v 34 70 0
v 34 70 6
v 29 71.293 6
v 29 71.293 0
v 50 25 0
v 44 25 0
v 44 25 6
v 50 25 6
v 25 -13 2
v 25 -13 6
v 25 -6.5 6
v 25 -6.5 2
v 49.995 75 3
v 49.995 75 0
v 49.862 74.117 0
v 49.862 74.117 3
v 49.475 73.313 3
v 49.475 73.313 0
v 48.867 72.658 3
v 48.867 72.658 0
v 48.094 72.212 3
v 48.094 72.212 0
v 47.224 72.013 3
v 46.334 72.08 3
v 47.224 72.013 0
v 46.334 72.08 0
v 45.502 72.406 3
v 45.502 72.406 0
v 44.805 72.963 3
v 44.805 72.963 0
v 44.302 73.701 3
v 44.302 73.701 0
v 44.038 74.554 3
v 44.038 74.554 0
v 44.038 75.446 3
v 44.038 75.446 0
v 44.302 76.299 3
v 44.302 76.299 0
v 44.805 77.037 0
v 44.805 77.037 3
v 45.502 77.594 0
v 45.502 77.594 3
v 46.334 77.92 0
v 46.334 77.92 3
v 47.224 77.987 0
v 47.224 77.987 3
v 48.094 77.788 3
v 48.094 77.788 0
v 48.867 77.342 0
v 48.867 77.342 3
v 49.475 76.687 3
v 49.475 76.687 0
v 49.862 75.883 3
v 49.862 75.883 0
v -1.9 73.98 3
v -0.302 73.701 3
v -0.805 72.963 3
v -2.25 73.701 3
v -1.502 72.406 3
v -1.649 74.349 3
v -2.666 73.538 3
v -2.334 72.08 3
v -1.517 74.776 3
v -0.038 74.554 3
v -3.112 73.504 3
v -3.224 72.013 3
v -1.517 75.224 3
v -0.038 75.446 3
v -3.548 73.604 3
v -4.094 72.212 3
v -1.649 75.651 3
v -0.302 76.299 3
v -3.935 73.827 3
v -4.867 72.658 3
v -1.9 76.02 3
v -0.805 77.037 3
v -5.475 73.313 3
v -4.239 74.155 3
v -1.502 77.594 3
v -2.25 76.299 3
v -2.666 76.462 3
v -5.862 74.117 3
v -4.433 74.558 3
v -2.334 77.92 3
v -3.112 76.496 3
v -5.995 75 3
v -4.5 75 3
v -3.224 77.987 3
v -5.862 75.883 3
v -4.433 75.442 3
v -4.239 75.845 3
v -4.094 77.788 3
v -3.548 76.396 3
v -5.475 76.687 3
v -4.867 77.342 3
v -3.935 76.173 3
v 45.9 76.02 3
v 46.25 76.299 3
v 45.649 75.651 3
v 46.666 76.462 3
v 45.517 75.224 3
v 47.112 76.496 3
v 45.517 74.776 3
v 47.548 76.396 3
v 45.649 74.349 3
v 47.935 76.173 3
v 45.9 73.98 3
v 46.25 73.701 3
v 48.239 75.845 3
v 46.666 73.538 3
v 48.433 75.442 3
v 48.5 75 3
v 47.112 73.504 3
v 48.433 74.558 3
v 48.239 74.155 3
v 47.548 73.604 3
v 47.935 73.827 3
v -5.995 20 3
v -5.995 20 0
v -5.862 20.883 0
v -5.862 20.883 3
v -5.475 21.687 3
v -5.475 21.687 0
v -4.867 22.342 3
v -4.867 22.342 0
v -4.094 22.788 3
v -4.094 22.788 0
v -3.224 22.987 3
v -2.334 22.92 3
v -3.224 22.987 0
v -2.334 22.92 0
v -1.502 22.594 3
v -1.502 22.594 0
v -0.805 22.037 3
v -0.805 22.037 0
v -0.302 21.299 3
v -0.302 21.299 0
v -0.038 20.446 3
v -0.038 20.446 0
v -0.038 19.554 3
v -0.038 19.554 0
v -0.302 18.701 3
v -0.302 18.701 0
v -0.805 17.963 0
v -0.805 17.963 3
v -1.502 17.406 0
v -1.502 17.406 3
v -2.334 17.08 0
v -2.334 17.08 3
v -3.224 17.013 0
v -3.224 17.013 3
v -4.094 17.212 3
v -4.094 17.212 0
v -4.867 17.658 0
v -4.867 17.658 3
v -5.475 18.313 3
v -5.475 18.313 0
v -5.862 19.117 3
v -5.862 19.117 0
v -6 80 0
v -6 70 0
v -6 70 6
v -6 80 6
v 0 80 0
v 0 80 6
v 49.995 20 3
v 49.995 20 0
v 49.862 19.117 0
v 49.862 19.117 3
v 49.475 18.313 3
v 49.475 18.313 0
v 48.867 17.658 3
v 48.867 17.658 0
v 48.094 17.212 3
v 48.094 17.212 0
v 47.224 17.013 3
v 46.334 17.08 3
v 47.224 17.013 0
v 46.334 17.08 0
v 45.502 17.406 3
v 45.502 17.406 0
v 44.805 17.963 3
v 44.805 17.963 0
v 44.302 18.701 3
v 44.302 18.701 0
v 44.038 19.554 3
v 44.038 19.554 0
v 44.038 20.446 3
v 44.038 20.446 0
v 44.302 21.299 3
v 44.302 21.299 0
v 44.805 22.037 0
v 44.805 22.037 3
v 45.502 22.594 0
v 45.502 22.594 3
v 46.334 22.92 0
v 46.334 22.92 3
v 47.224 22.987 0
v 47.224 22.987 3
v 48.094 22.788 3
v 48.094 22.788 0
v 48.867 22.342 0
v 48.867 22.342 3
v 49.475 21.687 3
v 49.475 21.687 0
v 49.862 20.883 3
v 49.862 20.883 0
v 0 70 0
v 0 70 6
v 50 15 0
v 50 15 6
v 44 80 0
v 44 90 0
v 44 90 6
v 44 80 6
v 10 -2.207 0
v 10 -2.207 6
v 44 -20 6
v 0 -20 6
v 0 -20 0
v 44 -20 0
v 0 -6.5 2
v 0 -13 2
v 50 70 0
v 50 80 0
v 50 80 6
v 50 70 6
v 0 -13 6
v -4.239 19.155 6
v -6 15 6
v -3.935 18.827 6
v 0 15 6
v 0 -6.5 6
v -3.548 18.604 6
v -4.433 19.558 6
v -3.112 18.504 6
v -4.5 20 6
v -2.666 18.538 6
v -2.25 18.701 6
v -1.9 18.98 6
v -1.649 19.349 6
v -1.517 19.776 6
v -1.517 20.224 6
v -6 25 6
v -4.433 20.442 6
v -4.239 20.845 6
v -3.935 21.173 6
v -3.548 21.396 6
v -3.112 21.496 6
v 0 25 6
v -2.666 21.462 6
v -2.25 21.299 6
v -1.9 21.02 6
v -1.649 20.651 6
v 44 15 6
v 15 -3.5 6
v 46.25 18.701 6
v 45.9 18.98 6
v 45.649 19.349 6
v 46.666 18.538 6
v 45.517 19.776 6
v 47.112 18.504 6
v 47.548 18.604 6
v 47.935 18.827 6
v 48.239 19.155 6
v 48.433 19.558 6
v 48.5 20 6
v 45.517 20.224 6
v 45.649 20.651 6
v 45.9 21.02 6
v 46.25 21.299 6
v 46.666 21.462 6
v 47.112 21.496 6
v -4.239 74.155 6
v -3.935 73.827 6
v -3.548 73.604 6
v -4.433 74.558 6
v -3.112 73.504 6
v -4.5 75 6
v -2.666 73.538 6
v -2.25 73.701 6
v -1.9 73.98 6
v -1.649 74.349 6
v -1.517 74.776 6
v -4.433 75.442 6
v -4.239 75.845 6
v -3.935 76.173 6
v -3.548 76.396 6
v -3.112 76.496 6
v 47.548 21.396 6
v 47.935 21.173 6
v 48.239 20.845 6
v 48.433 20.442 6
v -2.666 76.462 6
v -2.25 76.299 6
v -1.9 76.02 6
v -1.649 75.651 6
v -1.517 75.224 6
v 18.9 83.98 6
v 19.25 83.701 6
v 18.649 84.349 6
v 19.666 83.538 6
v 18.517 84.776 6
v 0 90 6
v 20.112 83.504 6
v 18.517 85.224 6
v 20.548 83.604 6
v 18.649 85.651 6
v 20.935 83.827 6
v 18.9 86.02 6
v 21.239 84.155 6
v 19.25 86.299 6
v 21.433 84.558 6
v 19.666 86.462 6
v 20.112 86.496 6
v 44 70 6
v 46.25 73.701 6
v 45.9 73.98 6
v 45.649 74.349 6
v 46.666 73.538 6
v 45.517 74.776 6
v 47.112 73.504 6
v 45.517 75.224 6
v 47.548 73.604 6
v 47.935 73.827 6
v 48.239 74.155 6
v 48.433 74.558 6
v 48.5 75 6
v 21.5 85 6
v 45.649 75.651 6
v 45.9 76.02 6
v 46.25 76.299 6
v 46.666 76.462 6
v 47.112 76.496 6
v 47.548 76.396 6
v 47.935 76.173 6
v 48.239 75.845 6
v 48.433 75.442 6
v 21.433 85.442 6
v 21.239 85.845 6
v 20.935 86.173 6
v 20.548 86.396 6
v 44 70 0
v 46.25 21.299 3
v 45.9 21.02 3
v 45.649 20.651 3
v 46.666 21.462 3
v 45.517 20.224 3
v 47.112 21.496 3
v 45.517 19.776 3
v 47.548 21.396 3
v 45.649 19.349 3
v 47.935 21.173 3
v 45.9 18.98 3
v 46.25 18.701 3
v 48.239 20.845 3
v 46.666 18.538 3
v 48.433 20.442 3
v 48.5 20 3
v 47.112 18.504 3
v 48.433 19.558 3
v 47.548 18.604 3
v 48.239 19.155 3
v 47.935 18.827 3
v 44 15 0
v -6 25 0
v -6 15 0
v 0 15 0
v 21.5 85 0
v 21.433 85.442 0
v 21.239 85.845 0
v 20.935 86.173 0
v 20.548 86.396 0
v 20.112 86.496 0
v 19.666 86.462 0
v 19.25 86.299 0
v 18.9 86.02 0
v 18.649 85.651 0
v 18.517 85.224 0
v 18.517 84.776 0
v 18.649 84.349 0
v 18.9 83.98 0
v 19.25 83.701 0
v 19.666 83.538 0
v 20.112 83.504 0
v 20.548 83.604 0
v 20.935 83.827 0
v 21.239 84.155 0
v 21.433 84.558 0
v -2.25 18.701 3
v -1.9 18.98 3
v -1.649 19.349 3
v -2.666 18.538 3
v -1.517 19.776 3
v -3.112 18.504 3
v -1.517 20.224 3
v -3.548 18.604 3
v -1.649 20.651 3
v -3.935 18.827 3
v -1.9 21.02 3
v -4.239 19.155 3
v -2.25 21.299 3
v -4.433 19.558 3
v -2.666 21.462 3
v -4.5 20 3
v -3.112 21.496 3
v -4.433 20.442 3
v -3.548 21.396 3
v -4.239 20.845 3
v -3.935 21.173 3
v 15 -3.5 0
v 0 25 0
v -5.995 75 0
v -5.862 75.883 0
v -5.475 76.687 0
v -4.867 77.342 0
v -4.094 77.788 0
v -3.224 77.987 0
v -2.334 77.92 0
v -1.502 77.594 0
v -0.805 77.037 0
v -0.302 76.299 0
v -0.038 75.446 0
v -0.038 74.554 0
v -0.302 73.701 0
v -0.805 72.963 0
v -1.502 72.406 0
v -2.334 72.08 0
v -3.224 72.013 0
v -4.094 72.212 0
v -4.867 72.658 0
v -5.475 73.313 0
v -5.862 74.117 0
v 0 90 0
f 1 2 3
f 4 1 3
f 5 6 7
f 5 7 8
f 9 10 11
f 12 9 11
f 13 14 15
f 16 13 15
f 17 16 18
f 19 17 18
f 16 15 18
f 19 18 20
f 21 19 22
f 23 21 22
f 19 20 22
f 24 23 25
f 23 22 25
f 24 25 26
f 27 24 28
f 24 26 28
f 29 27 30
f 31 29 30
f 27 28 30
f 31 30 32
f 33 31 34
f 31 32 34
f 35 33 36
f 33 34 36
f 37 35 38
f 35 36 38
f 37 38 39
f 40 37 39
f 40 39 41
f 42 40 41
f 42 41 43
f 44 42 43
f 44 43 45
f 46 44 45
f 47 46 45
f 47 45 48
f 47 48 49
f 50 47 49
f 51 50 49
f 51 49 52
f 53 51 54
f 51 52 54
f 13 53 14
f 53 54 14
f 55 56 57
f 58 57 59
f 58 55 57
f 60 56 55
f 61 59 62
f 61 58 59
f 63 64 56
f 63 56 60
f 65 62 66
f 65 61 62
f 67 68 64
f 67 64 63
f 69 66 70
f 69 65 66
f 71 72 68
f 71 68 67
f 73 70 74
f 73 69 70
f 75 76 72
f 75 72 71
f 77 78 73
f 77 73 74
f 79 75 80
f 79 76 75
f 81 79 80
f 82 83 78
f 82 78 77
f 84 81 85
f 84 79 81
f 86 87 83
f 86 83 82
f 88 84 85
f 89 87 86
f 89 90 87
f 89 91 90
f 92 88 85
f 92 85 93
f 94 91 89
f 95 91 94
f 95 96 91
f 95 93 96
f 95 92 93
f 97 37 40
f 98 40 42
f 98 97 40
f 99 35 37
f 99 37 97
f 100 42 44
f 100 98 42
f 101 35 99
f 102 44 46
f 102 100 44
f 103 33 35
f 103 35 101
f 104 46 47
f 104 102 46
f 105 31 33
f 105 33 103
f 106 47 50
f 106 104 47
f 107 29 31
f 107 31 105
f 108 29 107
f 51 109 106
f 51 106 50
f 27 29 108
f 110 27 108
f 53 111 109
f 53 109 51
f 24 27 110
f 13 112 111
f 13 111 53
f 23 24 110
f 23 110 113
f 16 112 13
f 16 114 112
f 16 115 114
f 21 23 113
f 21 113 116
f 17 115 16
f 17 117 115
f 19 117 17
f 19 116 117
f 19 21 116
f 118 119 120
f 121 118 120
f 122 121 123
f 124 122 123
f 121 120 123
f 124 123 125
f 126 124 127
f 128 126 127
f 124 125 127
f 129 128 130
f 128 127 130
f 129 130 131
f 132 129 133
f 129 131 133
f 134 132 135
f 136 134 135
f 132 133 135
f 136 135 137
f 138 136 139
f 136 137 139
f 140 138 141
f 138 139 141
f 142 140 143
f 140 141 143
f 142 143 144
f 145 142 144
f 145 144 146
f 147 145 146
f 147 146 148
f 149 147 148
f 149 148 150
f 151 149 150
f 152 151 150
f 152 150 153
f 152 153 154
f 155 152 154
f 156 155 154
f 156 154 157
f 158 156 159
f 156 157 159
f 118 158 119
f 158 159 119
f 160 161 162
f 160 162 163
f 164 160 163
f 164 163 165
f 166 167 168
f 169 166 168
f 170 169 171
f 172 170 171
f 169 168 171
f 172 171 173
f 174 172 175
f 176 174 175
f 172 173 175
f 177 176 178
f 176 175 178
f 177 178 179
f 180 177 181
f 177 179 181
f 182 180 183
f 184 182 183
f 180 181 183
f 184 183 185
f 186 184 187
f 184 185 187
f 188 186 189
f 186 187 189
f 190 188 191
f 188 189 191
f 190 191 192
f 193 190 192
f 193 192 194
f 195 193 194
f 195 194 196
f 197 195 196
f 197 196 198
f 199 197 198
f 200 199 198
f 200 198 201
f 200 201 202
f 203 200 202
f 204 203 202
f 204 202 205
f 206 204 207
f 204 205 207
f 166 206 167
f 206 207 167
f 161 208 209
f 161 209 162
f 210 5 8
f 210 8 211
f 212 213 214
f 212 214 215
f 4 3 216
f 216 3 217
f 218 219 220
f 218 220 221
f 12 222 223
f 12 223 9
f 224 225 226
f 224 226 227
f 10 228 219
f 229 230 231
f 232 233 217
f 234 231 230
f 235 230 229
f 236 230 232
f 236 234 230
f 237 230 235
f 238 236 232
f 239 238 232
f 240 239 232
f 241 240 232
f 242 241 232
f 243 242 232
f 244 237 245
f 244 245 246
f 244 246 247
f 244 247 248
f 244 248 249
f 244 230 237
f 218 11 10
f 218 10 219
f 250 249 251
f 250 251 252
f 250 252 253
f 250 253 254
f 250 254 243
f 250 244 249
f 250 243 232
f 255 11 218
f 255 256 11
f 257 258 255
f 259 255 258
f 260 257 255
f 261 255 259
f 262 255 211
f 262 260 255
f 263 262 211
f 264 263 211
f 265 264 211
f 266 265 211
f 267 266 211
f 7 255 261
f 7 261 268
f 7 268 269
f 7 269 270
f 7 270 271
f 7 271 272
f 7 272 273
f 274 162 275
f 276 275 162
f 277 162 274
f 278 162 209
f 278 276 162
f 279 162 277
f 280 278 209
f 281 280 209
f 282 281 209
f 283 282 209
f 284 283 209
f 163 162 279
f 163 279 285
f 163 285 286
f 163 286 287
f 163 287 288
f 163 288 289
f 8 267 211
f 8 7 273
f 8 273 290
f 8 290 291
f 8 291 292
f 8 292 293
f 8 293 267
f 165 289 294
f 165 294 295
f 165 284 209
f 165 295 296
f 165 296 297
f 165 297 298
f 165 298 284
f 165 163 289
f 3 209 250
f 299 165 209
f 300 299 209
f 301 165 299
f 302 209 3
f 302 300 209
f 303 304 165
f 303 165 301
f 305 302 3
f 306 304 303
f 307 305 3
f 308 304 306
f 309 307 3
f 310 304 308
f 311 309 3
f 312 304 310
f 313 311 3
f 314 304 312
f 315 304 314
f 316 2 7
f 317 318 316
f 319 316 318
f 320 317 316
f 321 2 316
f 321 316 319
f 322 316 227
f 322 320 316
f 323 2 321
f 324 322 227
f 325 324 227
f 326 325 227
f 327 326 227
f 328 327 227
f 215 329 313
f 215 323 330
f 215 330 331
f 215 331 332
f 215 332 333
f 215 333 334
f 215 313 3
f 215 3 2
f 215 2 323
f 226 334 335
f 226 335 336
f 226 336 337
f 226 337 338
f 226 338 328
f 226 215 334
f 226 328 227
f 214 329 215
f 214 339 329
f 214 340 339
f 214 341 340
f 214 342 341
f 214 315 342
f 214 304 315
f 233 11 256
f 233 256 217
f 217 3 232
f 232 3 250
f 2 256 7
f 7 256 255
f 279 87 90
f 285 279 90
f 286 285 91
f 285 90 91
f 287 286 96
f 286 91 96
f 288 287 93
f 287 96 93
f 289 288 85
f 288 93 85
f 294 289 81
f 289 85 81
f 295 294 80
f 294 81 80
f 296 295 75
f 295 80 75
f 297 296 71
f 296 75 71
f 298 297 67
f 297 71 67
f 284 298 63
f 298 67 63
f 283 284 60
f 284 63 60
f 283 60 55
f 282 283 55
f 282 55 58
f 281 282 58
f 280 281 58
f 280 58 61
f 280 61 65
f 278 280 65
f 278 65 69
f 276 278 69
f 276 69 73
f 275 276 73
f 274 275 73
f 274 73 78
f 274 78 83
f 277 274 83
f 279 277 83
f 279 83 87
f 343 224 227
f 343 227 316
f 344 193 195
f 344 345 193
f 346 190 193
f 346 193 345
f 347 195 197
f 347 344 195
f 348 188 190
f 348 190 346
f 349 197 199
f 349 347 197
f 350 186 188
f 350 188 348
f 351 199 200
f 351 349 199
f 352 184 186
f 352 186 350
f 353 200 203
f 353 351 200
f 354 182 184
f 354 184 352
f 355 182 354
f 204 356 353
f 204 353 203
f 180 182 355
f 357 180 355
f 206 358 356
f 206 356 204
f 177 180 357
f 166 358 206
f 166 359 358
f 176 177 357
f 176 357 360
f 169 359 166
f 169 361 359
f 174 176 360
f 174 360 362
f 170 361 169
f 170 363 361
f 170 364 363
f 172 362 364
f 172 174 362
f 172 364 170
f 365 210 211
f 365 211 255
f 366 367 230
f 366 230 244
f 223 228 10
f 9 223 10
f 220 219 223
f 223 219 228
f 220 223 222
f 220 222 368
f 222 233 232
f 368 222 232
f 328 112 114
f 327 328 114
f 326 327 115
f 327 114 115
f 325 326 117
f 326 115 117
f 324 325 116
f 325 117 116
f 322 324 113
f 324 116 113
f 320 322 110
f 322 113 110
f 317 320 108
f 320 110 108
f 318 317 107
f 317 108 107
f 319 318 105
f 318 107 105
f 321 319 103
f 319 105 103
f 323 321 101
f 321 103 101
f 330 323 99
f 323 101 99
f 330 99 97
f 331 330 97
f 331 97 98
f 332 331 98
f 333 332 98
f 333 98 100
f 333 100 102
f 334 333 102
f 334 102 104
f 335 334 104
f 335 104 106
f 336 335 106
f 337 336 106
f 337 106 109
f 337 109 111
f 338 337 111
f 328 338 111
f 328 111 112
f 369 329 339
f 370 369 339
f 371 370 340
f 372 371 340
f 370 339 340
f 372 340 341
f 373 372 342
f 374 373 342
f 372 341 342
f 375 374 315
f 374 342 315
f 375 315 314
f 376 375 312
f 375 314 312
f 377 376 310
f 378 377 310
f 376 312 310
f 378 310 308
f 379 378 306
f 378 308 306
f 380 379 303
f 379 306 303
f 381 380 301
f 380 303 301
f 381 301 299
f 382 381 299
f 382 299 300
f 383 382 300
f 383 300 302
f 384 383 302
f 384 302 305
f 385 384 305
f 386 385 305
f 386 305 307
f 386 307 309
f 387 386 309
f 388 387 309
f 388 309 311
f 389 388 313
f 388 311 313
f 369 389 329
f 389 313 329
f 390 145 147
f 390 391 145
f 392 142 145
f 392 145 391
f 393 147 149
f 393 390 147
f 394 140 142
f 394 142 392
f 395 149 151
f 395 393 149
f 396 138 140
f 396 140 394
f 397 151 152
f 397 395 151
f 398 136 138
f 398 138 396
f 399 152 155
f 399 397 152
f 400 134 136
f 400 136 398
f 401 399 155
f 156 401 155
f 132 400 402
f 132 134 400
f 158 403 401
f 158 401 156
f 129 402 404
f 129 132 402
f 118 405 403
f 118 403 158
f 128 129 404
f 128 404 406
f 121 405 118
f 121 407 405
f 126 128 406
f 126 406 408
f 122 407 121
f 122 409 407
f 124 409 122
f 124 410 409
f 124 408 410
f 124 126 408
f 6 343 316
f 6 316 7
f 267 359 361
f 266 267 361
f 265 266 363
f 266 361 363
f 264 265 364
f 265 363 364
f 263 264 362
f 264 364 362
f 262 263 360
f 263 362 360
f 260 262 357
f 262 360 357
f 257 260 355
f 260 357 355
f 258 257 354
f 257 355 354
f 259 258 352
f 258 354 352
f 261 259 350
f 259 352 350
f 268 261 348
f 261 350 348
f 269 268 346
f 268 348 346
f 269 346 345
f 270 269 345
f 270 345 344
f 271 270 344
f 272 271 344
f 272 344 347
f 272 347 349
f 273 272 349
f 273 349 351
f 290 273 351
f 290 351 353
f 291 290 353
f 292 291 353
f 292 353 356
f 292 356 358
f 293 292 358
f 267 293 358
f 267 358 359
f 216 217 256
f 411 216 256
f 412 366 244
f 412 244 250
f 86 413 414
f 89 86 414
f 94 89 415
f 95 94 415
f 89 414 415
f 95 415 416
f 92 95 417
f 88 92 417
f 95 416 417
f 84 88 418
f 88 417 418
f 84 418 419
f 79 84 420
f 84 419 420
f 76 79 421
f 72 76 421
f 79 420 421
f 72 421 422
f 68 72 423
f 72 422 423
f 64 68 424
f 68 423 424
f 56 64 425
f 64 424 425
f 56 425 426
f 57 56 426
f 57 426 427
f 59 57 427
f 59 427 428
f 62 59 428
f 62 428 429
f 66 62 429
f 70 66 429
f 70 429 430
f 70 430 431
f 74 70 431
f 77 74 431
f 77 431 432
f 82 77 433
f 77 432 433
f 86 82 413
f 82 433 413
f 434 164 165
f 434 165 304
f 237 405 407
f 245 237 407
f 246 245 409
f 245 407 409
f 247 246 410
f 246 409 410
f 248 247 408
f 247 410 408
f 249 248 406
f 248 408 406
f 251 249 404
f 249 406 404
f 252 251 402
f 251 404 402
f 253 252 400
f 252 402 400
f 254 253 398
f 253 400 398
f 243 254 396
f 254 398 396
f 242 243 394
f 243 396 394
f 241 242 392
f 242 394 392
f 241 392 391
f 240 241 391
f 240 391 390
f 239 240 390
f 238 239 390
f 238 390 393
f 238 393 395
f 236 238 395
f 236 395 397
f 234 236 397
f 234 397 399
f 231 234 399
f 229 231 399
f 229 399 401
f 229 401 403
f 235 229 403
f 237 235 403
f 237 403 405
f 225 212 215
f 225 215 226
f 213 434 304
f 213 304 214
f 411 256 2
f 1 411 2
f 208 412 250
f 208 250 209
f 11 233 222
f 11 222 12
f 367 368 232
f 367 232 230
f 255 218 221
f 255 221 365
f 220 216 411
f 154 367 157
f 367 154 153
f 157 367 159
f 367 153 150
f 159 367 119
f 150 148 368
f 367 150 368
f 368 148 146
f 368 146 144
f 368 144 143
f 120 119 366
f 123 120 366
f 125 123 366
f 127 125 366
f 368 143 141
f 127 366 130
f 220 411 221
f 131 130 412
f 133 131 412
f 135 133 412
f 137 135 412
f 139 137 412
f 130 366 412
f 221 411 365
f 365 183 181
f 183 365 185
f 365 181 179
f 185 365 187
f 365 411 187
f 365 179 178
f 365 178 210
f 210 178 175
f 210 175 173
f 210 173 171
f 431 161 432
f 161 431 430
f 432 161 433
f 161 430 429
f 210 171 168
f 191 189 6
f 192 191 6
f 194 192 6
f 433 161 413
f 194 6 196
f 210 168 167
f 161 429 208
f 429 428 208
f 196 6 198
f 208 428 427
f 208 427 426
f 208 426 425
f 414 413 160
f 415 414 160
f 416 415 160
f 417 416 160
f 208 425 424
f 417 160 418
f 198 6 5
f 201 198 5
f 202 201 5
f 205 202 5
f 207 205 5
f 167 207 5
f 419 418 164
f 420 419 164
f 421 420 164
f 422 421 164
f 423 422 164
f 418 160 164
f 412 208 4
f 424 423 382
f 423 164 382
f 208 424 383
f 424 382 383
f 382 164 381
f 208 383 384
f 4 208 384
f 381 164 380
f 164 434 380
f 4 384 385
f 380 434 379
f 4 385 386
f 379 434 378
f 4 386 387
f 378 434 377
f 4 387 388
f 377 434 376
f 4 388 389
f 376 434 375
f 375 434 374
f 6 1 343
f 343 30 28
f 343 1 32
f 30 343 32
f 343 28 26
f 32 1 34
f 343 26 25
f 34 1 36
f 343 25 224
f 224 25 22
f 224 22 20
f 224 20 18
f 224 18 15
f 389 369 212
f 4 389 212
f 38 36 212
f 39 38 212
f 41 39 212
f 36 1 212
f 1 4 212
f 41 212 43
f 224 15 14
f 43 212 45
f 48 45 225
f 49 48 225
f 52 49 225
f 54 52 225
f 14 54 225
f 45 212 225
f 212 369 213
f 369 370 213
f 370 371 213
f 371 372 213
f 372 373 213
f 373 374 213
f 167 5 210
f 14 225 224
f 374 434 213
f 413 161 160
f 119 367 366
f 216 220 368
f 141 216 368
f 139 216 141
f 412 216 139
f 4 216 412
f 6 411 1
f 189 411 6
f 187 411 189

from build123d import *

# Parameters (mm, degrees)
BOSS_EXTRU_1_DEPTH       = 6
ESQUISSE2_R              = 1.5
ENL_V_MAT_EXTRU_1_DEPTH  = 6
ESQUISSE5_R              = 1.5
ENL_V_MAT_EXTRU_6_DEPTH  = 6
ESQUISSE6_R              = 2.995
ENL_V_MAT_EXTRU_7_DEPTH  = 3
ESQUISSE9_W              = 44
ESQUISSE9_H              = 20
BOSS_EXTRU_3_DEPTH       = 6
ESQUISSE10_W             = 25
ESQUISSE10_H             = 6.5
ENL_V_MAT_EXTRU_9_DEPTH  = 4
ENL_V_MAT_EXTRU_11_DEPTH = 6


with BuildPart() as part:
    # Esquisse1 → Boss.-Extru.1 (new body)
    with BuildSketch(Plane.XY):
        Polygon((0, 80), (0, 90), (44, 90), (44, 80), (50, 80), (50, 70), (44, 70), (44, 25), (50, 25), (50, 15), (44, 15), (44, 0), (0, 0), (0, 15), (-6, 15), (-6, 25), (0, 25), (0, 70), (-6, 70), (-6, 80), align=None)
    extrude(amount=BOSS_EXTRU_1_DEPTH)

    # Esquisse2 → Enlèv. mat.-Extru.1 (cut)
    with BuildSketch(Plane.XY.offset(6)):
        with Locations((20, 85)):
            Circle(ESQUISSE2_R)
    extrude(amount=-ENL_V_MAT_EXTRU_1_DEPTH, mode=Mode.SUBTRACT)

    # Esquisse5 → Enlèv. mat.-Extru.6 (cut)
    with BuildSketch(Plane(origin=(0, 0, 0), x_dir=(-1, 0, 0), z_dir=(0, 0, -1))):
        with Locations((3, 75)):
            Circle(ESQUISSE5_R)
        with Locations((3, 20)):
            Circle(ESQUISSE5_R)
        with Locations(Location((-47, 20, 0), (0, 0, 180))):
            Circle(ESQUISSE5_R)
        with Locations(Location((-47, 75, 0), (0, 0, 180))):
            Circle(ESQUISSE5_R)
    extrude(amount=-ENL_V_MAT_EXTRU_6_DEPTH, mode=Mode.SUBTRACT)

    # Esquisse6 → Enlèv. mat.-Extru.7 (cut)
    with BuildSketch(Plane(origin=(0, 0, 0), x_dir=(-1, 0, 0), z_dir=(0, 0, -1))):
        with Locations((3, 20)):
            Circle(ESQUISSE6_R)
        with Locations((3, 75)):
            Circle(ESQUISSE6_R)
        with Locations(Location((-47, 75, 0), (0, 0, 180))):
            Circle(ESQUISSE6_R)
        with Locations(Location((-47, 20, 0), (0, 0, 180))):
            Circle(ESQUISSE6_R)
    extrude(amount=-ENL_V_MAT_EXTRU_7_DEPTH, mode=Mode.SUBTRACT)

    # Esquisse9 → Boss.-Extru.3 (add)
    with BuildSketch(Plane.XY.offset(6)):
        with Locations((22, -10)):
            Rectangle(ESQUISSE9_W, ESQUISSE9_H)
    extrude(amount=-BOSS_EXTRU_3_DEPTH)

    # Esquisse10 → Enlèv. mat.-Extru.9 (cut)
    with BuildSketch(Plane.XY.offset(6)):
        with Locations((12.5, -9.75)):
            Rectangle(ESQUISSE10_W, ESQUISSE10_H)
    extrude(amount=-ENL_V_MAT_EXTRU_9_DEPTH, mode=Mode.SUBTRACT)

    # Esquisse11 → Enlèv. mat.-Extru.11 (cut)
    with BuildSketch(Plane.XY.offset(6)):
        Polygon((29, 71.292517007), (10, -2.207482993), (15, -3.5), (34, 70), align=None)
    extrude(amount=-ENL_V_MAT_EXTRU_11_DEPTH, mode=Mode.SUBTRACT)


solid = part.part
